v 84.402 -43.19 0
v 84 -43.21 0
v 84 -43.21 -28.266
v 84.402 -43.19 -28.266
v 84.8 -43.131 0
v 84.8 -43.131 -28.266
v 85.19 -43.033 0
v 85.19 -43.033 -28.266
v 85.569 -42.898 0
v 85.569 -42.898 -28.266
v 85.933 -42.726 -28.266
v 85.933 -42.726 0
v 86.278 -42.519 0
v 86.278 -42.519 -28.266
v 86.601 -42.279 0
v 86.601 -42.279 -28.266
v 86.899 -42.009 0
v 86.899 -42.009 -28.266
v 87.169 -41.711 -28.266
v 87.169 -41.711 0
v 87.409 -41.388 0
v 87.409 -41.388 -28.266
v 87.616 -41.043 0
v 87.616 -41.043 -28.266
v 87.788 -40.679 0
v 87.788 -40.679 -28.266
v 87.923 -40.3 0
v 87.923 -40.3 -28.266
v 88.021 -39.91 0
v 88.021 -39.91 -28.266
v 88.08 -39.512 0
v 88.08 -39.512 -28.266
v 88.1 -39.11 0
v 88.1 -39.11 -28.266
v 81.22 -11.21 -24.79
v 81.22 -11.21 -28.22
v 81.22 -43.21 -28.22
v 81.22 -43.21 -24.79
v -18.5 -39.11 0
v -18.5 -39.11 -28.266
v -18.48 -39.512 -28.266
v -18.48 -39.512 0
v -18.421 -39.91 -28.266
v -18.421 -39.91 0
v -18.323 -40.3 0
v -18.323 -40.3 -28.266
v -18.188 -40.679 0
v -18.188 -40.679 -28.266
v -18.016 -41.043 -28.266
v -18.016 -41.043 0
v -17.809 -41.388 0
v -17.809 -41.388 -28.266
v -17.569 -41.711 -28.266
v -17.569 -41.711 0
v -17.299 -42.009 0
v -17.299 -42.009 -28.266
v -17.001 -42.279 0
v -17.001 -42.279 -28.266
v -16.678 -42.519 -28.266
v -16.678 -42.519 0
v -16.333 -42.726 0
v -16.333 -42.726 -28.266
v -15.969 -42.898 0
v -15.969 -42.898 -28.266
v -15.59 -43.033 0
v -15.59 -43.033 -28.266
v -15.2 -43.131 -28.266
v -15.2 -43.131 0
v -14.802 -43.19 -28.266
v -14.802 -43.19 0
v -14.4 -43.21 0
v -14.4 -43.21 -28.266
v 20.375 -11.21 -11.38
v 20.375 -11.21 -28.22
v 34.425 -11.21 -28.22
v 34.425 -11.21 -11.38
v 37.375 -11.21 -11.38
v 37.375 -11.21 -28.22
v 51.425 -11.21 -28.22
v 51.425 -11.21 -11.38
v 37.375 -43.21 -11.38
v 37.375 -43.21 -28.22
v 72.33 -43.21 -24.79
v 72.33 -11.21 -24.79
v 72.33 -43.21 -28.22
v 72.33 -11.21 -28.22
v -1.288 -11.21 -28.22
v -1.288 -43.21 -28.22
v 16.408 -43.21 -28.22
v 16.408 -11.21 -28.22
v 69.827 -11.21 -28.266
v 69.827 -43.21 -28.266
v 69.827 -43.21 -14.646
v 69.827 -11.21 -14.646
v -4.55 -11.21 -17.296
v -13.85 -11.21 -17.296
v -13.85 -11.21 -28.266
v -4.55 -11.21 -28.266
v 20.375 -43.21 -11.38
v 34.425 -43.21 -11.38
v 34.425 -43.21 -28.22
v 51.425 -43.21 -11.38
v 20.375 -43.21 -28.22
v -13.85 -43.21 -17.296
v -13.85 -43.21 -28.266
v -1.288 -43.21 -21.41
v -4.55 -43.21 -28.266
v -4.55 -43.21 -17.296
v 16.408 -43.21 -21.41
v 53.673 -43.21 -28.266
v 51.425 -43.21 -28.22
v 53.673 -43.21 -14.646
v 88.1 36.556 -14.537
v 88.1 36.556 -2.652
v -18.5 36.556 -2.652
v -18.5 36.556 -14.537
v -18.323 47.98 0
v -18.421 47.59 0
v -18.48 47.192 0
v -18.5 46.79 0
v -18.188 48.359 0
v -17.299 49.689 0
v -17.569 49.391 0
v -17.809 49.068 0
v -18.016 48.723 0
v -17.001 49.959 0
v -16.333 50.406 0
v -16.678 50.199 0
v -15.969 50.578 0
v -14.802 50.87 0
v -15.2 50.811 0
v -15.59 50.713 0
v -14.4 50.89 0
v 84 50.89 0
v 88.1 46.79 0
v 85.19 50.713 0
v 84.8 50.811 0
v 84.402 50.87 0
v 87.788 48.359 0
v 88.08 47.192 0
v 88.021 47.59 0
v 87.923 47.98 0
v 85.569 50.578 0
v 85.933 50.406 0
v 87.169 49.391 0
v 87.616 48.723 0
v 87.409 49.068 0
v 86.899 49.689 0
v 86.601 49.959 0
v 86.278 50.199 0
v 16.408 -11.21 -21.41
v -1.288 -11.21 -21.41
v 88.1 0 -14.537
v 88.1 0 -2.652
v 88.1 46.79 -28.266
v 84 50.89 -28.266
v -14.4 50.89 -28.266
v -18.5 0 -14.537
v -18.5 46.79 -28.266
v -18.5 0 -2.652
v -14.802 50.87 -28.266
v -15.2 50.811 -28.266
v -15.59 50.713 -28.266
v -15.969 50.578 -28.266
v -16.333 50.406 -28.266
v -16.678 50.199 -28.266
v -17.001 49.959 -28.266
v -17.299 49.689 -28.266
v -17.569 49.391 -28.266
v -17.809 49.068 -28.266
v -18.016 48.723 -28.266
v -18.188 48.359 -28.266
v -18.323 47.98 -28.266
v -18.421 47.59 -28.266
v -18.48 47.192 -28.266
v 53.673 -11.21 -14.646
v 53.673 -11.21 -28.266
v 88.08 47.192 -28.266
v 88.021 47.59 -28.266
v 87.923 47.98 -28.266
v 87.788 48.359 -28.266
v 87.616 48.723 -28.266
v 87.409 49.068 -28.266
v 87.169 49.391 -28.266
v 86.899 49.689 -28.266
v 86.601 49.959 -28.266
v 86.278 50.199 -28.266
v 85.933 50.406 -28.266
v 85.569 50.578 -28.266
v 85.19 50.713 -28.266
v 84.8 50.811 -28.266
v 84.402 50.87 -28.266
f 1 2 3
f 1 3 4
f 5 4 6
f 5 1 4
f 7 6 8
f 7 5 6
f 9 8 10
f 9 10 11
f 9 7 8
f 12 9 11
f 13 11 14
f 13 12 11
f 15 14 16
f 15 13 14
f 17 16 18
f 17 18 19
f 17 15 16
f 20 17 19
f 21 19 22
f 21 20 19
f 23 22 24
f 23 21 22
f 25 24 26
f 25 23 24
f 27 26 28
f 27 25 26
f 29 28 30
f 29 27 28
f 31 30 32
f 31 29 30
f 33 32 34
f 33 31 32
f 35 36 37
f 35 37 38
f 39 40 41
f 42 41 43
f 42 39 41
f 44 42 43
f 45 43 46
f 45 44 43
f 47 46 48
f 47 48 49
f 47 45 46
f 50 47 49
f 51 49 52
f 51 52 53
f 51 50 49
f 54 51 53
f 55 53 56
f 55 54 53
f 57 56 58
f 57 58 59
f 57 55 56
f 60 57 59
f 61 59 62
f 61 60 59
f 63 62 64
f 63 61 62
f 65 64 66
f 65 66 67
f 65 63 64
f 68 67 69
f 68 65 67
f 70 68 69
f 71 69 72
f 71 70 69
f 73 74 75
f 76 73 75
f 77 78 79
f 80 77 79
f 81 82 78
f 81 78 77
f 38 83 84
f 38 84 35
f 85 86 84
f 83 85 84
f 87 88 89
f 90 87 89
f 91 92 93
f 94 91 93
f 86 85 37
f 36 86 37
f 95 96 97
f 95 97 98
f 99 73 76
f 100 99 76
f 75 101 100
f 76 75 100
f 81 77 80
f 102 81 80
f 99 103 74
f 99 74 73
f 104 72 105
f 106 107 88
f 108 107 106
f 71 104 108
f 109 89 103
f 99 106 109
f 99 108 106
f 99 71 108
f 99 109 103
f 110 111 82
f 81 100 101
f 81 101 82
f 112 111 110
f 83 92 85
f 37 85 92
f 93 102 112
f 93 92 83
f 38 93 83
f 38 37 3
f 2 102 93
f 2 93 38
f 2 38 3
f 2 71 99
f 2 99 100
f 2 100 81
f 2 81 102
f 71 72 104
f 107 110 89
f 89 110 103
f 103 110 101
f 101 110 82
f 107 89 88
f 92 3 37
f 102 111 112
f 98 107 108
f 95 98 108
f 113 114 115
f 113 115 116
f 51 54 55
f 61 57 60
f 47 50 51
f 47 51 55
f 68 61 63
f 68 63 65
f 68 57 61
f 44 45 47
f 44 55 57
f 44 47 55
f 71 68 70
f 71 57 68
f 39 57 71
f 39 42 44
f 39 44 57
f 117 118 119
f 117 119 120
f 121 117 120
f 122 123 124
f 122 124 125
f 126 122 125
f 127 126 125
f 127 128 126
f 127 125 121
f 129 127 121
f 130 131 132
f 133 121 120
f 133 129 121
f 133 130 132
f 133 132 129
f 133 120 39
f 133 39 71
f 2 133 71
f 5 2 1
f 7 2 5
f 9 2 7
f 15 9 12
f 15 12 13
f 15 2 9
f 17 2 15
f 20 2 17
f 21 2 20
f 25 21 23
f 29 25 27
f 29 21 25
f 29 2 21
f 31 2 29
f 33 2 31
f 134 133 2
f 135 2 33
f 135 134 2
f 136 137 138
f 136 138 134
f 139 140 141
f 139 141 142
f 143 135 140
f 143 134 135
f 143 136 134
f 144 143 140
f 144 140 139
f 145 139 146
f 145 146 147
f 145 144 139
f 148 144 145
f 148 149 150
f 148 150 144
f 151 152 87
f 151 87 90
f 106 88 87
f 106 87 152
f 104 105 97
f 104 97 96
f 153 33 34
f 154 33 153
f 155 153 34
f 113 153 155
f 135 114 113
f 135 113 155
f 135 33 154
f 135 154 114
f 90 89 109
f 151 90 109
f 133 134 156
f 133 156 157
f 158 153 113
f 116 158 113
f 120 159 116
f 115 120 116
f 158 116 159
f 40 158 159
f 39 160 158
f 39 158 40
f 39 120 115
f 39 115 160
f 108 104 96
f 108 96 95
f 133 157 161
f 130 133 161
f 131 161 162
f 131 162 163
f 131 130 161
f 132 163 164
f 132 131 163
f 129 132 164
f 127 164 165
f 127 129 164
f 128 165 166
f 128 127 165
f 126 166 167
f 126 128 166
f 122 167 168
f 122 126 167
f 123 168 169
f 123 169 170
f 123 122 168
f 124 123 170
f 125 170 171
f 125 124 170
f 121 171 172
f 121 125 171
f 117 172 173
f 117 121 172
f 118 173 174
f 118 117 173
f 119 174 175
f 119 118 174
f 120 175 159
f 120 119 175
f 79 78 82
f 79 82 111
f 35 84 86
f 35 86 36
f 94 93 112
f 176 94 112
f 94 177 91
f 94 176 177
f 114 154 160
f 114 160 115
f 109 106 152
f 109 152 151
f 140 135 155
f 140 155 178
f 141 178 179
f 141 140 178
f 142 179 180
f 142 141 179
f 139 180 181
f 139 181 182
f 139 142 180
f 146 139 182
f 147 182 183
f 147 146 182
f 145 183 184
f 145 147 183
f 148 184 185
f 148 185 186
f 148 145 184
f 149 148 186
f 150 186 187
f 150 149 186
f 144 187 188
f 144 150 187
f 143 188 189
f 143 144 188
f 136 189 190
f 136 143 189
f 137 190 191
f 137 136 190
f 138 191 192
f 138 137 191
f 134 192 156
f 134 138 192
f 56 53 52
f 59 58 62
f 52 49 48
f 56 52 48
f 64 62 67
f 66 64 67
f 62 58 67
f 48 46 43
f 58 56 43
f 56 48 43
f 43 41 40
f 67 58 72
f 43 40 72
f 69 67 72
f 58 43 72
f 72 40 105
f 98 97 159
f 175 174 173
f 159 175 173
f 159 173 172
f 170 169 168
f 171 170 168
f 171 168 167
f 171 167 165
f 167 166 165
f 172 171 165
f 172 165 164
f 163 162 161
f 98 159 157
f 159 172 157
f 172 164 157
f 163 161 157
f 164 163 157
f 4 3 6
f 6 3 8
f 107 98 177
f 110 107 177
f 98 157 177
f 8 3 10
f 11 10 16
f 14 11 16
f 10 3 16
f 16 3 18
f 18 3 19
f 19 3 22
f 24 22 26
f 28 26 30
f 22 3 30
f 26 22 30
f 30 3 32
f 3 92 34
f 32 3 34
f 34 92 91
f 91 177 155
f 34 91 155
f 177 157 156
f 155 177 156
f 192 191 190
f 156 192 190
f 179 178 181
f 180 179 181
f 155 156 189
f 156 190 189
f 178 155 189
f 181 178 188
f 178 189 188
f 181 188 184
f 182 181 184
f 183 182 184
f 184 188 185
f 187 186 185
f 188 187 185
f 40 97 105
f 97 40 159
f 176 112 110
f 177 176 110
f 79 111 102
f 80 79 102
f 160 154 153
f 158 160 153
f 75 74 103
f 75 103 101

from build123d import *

# Parameters (mm, degrees)
BOSS_EXTRUDE2_DEPTH = 2
BOSS_EXTRUDE3_DEPTH = 28.266
SKETCH5_W           = 11.884268041
SKETCH5_H           = 36.556167698
CUT_EXTRUDE3_DEPTH  = 122.459124219
SKETCH7_W           = 8.89
SKETCH7_H           = 3.43
SKETCH7_W_2         = 14.05
SKETCH7_H_2         = 16.84
SKETCH7_W_3         = 17.696
SKETCH7_H_3         = 6.81
SKETCH7_W_4         = 9.3
SKETCH7_H_4         = 11
CUT_EXTRUDE4_DEPTH  = 32


with BuildPart() as part:
    # Sketch1 → Boss-Extrude2 (new body)
    with BuildSketch(Plane.XY):
        with BuildLine():
            Line((-14.4, -41.21), (84, -41.21))
            ThreePointArc((84, -41.21), (85.48492424, -40.59492424), (86.1, -39.11))
            Line((86.1, -39.11), (86.1, 46.79))
            ThreePointArc((86.1, 46.79), (85.48492424, 48.27492424), (84, 48.89))
            Line((84, 48.89), (-14.4, 48.89))
            ThreePointArc((-14.4, 48.89), (-15.88492424, 48.27492424), (-16.5, 46.79))
            Line((-16.5, 46.79), (-16.5, -39.11))
            ThreePointArc((-16.5, -39.11), (-15.88492424, -40.59492424), (-14.4, -41.21))
        make_face()
    extrude(amount=-BOSS_EXTRUDE2_DEPTH)

    # Sketch3 → Boss-Extrude3 (add)
    with BuildSketch(Plane.XY):
        with BuildLine():
            Line((-14.4, -43.21), (84, -43.21))
            ThreePointArc((84, -43.21), (86.899137803, -42.009137803), (88.1, -39.11))
            Line((88.1, -39.11), (88.1, 46.79))
            ThreePointArc((88.1, 46.79), (86.899137803, 49.689137803), (84, 50.89))
            Line((84, 50.89), (-14.4, 50.89))
            ThreePointArc((-14.4, 50.89), (-17.299137803, 49.689137803), (-18.5, 46.79))
            Line((-18.5, 46.79), (-18.5, -39.11))
            ThreePointArc((-18.5, -39.11), (-17.299137803, -42.009137803), (-14.4, -43.21))
        make_face()
    extrude(amount=-BOSS_EXTRUDE3_DEPTH)

    # Sketch5 → Cut-Extrude3 (cut, through all)
    with BuildSketch(Plane(origin=(88.1, 0, 0), x_dir=(0, 0, -1), z_dir=(1, 0, 0))):
        with Locations((8.594465961, 18.278083849)):
            Rectangle(SKETCH5_W, SKETCH5_H)
    extrude(amount=-CUT_EXTRUDE3_DEPTH, mode=Mode.SUBTRACT)

    # Sketch7 → Cut-Extrude4 (cut)
    with BuildSketch(Plane.XZ.offset(43.21)):
        with Locations((76.775, -26.5048)):
            Rectangle(SKETCH7_W, SKETCH7_H)
        Polygon((68.12, -28.296), (69.827, -28.296), (69.827, -14.646007205), (68.12, -14.646007205), (66.12, -14.646007205), (57.38, -14.646007205), (55.38, -14.646007205), (53.673, -14.646007205), (53.673, -28.296), (55.38, -28.296), (57.38, -28.296), (66.12, -28.296), align=None)
        with Locations((44.4, -19.7998)):
            Rectangle(SKETCH7_W_2, SKETCH7_H_2)
        with Locations((27.4, -19.7998)):
            Rectangle(SKETCH7_W_2, SKETCH7_H_2)
        with Locations((7.56, -24.8148)):
            Rectangle(SKETCH7_W_3, SKETCH7_H_3)
        with Locations((-9.2, -22.796)):
            Rectangle(SKETCH7_W_4, SKETCH7_H_4)
    extrude(amount=-CUT_EXTRUDE4_DEPTH, mode=Mode.SUBTRACT)


solid = part.part
